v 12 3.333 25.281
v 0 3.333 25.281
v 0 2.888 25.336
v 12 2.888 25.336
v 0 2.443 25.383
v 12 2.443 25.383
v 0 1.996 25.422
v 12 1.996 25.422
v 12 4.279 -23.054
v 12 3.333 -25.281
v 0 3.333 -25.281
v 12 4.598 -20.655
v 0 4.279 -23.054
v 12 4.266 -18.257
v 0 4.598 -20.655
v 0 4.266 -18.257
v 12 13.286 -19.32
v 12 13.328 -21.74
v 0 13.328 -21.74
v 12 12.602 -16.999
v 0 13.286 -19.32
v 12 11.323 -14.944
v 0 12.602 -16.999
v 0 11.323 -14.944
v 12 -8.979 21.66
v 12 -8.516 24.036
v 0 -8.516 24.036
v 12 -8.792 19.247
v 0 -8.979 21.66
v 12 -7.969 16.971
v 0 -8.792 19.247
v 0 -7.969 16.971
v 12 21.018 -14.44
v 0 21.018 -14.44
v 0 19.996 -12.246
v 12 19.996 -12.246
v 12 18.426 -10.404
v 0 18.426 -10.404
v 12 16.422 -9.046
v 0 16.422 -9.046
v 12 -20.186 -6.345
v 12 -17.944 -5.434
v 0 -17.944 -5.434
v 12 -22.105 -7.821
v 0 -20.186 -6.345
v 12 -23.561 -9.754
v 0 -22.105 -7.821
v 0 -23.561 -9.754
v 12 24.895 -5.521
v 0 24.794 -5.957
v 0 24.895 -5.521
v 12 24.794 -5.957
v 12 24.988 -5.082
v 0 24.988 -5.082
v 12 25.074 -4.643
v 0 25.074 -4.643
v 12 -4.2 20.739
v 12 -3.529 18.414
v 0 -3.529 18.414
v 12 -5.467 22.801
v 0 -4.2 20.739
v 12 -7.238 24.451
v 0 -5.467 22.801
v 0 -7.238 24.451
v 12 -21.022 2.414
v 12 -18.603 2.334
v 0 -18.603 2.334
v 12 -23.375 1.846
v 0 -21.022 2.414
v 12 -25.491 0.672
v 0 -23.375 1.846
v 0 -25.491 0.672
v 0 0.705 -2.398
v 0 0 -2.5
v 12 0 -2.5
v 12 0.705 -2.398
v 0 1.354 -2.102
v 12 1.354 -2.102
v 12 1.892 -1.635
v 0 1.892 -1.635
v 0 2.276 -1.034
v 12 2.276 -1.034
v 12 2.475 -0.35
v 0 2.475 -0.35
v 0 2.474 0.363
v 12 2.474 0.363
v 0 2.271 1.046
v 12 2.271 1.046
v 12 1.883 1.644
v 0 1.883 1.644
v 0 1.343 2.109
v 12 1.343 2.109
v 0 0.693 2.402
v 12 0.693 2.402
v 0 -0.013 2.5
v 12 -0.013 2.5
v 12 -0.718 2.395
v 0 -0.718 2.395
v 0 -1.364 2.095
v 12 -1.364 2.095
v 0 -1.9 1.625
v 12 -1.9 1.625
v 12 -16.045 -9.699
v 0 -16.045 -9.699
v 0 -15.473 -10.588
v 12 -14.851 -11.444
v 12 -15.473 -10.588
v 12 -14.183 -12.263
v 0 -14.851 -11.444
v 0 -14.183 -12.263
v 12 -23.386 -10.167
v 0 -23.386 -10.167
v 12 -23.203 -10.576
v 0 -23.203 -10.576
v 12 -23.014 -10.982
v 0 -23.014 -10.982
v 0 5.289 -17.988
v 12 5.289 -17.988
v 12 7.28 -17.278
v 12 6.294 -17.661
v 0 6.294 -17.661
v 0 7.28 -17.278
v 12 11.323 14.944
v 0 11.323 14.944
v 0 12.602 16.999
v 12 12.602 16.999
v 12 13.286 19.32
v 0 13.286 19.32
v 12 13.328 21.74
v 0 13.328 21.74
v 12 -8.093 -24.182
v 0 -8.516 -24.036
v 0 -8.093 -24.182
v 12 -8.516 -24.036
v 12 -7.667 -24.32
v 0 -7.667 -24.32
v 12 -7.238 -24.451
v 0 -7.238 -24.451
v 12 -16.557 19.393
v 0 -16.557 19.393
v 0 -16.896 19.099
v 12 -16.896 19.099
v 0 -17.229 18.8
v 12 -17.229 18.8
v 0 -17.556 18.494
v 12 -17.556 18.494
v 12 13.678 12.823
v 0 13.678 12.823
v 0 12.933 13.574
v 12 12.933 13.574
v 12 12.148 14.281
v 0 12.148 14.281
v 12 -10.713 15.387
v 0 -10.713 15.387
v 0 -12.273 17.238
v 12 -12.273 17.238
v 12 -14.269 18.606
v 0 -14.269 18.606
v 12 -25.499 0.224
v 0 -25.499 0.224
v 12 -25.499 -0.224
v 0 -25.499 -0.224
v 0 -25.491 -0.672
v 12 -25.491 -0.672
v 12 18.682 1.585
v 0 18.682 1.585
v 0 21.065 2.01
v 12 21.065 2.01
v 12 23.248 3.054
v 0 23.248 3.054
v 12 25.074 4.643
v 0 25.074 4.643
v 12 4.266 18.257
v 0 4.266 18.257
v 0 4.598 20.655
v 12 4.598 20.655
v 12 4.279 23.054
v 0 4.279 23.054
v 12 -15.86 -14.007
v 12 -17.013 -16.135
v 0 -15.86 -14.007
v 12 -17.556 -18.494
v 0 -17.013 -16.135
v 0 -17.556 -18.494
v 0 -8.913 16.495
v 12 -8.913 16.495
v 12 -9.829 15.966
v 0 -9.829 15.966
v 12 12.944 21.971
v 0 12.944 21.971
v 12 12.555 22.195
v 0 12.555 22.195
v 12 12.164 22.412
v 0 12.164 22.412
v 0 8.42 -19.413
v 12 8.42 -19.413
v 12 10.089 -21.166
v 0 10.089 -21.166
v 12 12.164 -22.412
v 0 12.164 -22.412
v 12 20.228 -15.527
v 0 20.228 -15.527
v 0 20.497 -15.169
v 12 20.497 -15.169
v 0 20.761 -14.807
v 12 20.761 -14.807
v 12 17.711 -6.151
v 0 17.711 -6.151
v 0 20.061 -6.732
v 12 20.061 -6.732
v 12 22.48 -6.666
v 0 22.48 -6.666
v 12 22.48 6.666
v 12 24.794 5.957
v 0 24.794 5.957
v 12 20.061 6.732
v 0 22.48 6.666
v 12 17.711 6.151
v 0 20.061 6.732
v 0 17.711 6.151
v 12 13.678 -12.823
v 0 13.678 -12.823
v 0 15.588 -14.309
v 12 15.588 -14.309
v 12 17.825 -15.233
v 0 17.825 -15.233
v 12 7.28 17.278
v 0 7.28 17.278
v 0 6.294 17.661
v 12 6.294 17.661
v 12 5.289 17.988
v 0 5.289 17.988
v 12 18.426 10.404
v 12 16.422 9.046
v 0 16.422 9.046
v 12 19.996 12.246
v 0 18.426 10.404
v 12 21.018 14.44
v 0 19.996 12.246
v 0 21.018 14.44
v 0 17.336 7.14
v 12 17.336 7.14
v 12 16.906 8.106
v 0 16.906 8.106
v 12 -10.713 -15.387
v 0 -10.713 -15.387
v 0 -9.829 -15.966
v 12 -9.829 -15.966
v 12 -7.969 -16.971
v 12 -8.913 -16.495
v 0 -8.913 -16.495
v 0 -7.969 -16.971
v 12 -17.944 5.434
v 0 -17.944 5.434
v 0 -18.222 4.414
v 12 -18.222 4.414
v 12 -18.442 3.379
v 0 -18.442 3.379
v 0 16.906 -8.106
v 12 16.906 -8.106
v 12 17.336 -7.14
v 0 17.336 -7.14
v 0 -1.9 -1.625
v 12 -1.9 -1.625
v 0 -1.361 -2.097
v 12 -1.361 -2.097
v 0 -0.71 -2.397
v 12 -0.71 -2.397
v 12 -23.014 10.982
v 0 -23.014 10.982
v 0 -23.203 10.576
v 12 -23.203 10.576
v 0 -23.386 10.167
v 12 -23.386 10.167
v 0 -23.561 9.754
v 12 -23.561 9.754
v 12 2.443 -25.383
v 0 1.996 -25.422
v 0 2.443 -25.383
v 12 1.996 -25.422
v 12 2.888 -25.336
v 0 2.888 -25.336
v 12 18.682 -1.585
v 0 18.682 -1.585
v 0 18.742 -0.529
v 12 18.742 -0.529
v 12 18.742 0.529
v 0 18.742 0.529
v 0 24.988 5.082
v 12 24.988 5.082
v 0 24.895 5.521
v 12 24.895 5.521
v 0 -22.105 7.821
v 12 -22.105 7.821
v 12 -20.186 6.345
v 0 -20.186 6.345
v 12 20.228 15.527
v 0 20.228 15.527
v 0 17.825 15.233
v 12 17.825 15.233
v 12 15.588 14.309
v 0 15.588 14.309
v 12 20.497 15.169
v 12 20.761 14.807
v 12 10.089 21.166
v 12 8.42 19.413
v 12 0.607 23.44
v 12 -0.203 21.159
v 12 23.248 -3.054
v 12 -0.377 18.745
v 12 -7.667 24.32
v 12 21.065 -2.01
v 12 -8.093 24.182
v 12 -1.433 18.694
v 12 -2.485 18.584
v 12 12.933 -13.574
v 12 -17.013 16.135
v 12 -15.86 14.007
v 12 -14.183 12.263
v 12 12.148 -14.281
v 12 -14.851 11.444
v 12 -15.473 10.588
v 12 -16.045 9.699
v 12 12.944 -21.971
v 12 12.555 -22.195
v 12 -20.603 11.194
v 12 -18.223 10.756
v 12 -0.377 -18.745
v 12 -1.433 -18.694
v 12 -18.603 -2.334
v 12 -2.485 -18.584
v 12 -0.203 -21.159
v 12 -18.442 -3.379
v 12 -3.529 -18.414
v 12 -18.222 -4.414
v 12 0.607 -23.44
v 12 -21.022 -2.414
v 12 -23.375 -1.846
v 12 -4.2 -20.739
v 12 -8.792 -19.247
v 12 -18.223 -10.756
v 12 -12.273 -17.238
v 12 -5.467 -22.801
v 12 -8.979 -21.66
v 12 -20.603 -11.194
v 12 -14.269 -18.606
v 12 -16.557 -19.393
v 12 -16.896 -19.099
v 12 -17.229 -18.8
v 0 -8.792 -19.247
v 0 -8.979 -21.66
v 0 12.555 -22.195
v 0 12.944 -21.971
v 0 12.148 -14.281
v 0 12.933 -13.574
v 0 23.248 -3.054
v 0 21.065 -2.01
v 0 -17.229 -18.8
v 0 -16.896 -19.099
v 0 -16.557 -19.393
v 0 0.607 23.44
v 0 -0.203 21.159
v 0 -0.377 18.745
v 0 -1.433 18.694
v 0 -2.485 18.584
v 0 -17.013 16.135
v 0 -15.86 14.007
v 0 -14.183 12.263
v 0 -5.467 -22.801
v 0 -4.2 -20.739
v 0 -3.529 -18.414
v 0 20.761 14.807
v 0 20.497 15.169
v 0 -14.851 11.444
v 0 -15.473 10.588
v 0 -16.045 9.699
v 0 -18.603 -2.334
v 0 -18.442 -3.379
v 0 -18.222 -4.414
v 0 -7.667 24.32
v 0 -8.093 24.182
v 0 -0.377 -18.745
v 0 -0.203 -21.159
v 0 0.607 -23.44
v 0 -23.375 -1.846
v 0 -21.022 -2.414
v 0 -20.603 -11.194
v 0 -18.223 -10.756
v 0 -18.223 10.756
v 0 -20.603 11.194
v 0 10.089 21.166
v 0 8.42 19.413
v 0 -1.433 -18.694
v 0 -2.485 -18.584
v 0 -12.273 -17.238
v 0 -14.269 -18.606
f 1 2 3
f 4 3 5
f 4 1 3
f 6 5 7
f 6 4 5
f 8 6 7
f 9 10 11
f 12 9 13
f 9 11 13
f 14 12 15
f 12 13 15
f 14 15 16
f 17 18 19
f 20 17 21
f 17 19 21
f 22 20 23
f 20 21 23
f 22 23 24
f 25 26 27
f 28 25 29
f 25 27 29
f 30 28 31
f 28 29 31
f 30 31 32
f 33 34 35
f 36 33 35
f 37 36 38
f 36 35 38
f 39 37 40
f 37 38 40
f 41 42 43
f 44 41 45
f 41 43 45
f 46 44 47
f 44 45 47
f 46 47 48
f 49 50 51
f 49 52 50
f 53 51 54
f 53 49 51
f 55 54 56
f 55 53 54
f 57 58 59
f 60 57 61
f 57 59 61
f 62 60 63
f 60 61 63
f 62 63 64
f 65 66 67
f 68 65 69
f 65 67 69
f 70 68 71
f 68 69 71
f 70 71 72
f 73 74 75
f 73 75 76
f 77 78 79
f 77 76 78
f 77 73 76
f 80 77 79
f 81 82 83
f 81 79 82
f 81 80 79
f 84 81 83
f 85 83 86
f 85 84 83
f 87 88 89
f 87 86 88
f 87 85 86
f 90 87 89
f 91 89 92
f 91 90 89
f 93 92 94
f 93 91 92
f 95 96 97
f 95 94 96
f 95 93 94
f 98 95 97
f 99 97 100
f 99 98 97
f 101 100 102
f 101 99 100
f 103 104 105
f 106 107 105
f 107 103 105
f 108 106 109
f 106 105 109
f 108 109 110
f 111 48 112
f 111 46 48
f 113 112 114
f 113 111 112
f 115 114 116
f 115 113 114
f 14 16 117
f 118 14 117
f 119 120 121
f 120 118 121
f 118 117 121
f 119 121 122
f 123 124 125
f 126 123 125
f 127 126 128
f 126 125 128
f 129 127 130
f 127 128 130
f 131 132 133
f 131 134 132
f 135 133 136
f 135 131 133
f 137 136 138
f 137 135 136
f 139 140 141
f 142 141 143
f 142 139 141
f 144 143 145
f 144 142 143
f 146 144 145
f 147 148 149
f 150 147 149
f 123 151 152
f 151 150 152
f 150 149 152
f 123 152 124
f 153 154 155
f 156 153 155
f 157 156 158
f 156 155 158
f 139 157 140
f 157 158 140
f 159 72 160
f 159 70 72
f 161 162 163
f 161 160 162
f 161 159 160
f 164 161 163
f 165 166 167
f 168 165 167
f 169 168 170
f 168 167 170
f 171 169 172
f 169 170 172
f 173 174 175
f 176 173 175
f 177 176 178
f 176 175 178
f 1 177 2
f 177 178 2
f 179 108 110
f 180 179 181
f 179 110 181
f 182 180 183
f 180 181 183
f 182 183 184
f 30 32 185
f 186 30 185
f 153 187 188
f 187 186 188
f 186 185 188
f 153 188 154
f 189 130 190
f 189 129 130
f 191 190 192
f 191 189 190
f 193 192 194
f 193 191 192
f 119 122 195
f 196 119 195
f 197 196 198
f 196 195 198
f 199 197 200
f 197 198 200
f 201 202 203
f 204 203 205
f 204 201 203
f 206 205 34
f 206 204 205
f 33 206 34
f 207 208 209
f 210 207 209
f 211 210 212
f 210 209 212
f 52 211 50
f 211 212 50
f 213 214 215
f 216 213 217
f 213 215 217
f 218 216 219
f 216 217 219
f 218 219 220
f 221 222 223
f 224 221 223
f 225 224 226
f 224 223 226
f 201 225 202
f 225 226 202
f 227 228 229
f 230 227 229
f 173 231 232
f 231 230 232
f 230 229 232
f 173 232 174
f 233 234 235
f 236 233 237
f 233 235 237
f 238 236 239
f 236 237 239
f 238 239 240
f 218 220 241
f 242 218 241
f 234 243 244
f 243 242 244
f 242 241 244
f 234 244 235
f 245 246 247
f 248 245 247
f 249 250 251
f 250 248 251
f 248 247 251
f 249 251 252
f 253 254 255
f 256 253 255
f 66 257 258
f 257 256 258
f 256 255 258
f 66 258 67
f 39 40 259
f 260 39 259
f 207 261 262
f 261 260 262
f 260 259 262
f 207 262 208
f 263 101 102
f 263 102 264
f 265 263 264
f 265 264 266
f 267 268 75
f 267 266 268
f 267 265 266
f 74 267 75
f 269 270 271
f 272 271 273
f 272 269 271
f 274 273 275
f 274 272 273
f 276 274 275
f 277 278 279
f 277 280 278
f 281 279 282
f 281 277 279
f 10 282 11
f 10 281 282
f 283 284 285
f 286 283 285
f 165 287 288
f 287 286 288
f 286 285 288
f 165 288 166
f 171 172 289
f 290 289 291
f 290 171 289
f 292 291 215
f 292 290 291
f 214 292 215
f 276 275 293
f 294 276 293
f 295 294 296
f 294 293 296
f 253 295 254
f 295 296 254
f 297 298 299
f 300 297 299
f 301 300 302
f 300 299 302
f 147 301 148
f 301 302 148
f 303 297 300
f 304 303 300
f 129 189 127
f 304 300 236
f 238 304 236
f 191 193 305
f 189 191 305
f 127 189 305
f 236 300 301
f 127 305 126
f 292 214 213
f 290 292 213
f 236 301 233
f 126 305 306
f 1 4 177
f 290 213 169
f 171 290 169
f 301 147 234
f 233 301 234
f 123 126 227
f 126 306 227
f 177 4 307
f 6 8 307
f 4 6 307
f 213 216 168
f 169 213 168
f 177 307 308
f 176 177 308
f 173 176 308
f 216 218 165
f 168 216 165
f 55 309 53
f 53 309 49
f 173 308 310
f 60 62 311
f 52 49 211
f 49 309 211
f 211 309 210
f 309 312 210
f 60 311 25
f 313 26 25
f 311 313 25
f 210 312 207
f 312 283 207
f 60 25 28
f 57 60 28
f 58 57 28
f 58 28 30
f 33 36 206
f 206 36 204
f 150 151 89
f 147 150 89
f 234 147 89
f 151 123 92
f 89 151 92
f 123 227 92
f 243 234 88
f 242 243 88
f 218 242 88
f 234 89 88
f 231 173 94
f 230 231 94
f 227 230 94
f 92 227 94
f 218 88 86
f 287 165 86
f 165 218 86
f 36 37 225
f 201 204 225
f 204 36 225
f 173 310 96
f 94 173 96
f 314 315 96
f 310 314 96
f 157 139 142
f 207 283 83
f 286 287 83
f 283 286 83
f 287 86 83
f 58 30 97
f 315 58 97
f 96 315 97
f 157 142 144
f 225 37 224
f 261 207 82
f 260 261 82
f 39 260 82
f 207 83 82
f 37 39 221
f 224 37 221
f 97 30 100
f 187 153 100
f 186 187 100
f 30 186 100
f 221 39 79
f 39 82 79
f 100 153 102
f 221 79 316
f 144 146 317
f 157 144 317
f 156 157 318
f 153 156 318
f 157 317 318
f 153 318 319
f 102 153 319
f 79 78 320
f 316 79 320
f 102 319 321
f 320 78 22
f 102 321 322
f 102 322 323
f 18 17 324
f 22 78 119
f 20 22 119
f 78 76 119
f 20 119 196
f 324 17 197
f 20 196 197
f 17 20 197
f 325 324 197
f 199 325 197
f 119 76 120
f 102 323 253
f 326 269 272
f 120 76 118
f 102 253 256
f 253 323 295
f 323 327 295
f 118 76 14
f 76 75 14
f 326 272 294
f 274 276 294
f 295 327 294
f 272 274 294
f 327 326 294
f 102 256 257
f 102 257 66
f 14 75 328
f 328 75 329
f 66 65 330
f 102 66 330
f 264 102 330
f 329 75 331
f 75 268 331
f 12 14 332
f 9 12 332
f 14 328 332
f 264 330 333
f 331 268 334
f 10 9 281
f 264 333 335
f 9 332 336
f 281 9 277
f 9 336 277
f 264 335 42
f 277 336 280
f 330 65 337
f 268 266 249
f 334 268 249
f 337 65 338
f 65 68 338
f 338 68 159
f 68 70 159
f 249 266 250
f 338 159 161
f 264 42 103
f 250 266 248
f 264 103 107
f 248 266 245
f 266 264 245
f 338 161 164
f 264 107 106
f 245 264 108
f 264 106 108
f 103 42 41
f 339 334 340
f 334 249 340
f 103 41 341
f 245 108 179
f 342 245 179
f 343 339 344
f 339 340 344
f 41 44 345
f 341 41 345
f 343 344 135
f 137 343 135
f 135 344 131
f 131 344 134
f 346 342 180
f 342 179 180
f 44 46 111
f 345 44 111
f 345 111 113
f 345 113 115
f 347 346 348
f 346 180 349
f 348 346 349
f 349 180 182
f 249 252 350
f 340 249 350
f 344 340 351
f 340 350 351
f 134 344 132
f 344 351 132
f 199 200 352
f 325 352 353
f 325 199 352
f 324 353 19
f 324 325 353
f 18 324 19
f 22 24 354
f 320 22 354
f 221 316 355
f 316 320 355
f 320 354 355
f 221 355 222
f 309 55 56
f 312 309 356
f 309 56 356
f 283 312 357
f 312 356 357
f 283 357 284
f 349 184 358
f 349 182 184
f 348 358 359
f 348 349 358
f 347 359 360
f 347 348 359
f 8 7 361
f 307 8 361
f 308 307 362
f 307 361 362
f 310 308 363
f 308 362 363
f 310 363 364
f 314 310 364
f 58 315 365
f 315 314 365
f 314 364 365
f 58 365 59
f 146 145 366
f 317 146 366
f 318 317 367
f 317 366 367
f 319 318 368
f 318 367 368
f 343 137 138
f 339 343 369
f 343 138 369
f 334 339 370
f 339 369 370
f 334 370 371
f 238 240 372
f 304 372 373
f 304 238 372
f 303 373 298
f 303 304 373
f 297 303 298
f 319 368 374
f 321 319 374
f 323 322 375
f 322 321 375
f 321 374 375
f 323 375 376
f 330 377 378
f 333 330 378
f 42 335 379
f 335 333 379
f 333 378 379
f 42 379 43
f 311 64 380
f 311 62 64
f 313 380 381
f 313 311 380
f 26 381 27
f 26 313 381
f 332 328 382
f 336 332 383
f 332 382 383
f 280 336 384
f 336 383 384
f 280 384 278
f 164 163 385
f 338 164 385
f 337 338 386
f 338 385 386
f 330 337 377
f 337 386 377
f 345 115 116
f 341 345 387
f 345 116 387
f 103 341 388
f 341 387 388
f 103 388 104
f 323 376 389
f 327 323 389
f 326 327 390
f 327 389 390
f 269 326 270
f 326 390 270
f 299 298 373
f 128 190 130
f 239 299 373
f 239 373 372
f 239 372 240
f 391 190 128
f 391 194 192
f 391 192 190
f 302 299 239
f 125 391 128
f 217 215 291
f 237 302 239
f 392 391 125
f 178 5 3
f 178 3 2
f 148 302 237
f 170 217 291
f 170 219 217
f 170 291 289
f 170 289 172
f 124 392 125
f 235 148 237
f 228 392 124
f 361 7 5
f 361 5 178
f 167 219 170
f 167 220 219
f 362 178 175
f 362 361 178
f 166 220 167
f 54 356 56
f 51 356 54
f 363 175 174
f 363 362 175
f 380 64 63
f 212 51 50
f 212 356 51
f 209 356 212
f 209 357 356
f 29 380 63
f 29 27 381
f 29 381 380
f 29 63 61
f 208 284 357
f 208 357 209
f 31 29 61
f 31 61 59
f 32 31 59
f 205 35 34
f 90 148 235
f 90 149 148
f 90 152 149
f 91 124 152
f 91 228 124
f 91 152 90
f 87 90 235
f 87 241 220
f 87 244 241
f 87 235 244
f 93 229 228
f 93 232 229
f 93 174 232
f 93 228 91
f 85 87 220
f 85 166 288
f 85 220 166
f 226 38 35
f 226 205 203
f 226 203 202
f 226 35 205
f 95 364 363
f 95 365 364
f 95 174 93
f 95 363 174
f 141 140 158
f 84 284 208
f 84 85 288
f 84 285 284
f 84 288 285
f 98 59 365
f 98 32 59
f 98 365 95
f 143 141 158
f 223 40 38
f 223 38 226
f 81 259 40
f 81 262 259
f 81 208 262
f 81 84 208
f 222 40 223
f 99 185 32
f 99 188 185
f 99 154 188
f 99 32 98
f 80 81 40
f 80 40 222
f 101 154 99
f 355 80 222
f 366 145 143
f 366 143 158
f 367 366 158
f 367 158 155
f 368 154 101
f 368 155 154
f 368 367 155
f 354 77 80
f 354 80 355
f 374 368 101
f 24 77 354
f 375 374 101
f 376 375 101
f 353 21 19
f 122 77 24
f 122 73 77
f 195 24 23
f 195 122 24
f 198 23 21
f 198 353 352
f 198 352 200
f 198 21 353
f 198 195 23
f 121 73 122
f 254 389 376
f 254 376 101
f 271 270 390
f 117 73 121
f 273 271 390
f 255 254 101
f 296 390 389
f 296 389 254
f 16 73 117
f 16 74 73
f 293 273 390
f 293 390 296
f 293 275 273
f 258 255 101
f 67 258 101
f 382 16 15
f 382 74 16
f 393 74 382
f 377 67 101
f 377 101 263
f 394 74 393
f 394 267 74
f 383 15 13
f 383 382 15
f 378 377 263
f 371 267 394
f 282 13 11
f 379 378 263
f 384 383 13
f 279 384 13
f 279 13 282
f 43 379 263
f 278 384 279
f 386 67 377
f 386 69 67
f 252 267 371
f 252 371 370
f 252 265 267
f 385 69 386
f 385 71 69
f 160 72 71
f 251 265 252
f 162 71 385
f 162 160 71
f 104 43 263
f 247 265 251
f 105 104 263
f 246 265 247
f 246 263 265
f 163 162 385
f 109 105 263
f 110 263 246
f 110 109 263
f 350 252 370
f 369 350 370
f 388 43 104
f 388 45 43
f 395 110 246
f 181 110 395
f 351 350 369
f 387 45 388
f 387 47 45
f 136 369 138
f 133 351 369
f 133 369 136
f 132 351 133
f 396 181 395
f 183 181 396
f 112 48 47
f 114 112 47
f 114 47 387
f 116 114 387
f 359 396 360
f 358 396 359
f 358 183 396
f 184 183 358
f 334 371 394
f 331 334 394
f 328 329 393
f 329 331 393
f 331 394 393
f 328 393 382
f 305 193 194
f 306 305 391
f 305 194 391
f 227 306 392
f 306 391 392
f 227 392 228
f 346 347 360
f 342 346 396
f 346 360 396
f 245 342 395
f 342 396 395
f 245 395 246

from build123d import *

# Parameters (mm, degrees)
BASPROSKE_W             = 12
BASPROSKE_H             = 25.5
TOOTHCUT_DEPTH          = 39.006578378
TEETHCUTS_COUNT         = 15
TEETHCUTS_ANGLE         = 336
BORSKE_R                = 0.4
BORE_DEPTH              = 50.0000508
CUT_EXTRUDE1_DEPTH      = 38.954121274
CUT_EXTRUDE1_DEPTH_BACK = 38.954121274


with BuildPart() as part:
    # BasProSke → Base-Revolve (revolve)
    with BuildSketch(Plane(origin=(0, 0, 0), x_dir=(1, 0, 0), z_dir=(0, 1, 0)), mode=Mode.PRIVATE) as base_revolve_sk:
        with Locations((6, 12.75)):
            Rectangle(BASPROSKE_W, BASPROSKE_H)
    revolve(base_revolve_sk.sketch.rotate(Axis((-10, 0, 0), (1, 0, 0)), 180), axis=Axis((-10, 0, 0), (1, 0, 0)))

    # TooCutSke → ToothCut (cut, through all)
    with BuildSketch(Plane(origin=(0, 0, 0), x_dir=(0, 0, -1), z_dir=(1, 0, 0))):
        with BuildLine():
            ThreePointArc((1.584594428, 18.681918036), (0, 18.749), (-1.584594428, 18.681918036))
            ThreePointArc((-1.584594428, 18.681918036), (-2.465052499, 22.206073835), (-4.666912141, 25.095138498))
            ThreePointArc((-4.666912141, 25.095138498), (0, 25.5254), (4.666912141, 25.095138498))
            ThreePointArc((4.666912141, 25.095138498), (2.465052499, 22.206073835), (1.584594428, 18.681918036))
        make_face()
    toothcut = extrude(amount=TOOTHCUT_DEPTH, mode=Mode.SUBTRACT)

    # TeethCuts: ToothCut ×15 about axis
    teethcuts_axis = Axis((-10, 0, 0), (1, 0, 0))
    for i in range(1, TEETHCUTS_COUNT):
        add(toothcut.rotate(teethcuts_axis, i * TEETHCUTS_ANGLE / (TEETHCUTS_COUNT - 1)), mode=Mode.SUBTRACT)

    # BorSke → Bore (cut, symmetric)
    with BuildSketch(Plane(origin=(0, 0, 0), x_dir=(0, 0, -1), z_dir=(1, 0, 0))):
        with Locations(Location((0, 0, 0), (0, 0, 180))):
            Circle(BORSKE_R)
    extrude(amount=BORE_DEPTH, both=True, mode=Mode.SUBTRACT)

    # Sketch1 → Cut-Extrude1 (cut, two sides: drawn at the far end of the back side and taken through both)
    with BuildSketch(Plane(origin=(12, 0, 0), x_dir=(0, 0, -1), z_dir=(1, 0, 0)).offset(-CUT_EXTRUDE1_DEPTH_BACK)):
        with BuildLine():
            ThreePointArc((2.5, 0), (-1.045939959, 2.270684831), (-1.624807681, -1.9))
            Line((-1.624807681, -1.9), (1.624807681, -1.9))
            ThreePointArc((1.624807681, -1.9), (2.270684831, -1.045939959), (2.5, 0))
        make_face()
    extrude(amount=CUT_EXTRUDE1_DEPTH + CUT_EXTRUDE1_DEPTH_BACK, mode=Mode.SUBTRACT)


solid = part.part
